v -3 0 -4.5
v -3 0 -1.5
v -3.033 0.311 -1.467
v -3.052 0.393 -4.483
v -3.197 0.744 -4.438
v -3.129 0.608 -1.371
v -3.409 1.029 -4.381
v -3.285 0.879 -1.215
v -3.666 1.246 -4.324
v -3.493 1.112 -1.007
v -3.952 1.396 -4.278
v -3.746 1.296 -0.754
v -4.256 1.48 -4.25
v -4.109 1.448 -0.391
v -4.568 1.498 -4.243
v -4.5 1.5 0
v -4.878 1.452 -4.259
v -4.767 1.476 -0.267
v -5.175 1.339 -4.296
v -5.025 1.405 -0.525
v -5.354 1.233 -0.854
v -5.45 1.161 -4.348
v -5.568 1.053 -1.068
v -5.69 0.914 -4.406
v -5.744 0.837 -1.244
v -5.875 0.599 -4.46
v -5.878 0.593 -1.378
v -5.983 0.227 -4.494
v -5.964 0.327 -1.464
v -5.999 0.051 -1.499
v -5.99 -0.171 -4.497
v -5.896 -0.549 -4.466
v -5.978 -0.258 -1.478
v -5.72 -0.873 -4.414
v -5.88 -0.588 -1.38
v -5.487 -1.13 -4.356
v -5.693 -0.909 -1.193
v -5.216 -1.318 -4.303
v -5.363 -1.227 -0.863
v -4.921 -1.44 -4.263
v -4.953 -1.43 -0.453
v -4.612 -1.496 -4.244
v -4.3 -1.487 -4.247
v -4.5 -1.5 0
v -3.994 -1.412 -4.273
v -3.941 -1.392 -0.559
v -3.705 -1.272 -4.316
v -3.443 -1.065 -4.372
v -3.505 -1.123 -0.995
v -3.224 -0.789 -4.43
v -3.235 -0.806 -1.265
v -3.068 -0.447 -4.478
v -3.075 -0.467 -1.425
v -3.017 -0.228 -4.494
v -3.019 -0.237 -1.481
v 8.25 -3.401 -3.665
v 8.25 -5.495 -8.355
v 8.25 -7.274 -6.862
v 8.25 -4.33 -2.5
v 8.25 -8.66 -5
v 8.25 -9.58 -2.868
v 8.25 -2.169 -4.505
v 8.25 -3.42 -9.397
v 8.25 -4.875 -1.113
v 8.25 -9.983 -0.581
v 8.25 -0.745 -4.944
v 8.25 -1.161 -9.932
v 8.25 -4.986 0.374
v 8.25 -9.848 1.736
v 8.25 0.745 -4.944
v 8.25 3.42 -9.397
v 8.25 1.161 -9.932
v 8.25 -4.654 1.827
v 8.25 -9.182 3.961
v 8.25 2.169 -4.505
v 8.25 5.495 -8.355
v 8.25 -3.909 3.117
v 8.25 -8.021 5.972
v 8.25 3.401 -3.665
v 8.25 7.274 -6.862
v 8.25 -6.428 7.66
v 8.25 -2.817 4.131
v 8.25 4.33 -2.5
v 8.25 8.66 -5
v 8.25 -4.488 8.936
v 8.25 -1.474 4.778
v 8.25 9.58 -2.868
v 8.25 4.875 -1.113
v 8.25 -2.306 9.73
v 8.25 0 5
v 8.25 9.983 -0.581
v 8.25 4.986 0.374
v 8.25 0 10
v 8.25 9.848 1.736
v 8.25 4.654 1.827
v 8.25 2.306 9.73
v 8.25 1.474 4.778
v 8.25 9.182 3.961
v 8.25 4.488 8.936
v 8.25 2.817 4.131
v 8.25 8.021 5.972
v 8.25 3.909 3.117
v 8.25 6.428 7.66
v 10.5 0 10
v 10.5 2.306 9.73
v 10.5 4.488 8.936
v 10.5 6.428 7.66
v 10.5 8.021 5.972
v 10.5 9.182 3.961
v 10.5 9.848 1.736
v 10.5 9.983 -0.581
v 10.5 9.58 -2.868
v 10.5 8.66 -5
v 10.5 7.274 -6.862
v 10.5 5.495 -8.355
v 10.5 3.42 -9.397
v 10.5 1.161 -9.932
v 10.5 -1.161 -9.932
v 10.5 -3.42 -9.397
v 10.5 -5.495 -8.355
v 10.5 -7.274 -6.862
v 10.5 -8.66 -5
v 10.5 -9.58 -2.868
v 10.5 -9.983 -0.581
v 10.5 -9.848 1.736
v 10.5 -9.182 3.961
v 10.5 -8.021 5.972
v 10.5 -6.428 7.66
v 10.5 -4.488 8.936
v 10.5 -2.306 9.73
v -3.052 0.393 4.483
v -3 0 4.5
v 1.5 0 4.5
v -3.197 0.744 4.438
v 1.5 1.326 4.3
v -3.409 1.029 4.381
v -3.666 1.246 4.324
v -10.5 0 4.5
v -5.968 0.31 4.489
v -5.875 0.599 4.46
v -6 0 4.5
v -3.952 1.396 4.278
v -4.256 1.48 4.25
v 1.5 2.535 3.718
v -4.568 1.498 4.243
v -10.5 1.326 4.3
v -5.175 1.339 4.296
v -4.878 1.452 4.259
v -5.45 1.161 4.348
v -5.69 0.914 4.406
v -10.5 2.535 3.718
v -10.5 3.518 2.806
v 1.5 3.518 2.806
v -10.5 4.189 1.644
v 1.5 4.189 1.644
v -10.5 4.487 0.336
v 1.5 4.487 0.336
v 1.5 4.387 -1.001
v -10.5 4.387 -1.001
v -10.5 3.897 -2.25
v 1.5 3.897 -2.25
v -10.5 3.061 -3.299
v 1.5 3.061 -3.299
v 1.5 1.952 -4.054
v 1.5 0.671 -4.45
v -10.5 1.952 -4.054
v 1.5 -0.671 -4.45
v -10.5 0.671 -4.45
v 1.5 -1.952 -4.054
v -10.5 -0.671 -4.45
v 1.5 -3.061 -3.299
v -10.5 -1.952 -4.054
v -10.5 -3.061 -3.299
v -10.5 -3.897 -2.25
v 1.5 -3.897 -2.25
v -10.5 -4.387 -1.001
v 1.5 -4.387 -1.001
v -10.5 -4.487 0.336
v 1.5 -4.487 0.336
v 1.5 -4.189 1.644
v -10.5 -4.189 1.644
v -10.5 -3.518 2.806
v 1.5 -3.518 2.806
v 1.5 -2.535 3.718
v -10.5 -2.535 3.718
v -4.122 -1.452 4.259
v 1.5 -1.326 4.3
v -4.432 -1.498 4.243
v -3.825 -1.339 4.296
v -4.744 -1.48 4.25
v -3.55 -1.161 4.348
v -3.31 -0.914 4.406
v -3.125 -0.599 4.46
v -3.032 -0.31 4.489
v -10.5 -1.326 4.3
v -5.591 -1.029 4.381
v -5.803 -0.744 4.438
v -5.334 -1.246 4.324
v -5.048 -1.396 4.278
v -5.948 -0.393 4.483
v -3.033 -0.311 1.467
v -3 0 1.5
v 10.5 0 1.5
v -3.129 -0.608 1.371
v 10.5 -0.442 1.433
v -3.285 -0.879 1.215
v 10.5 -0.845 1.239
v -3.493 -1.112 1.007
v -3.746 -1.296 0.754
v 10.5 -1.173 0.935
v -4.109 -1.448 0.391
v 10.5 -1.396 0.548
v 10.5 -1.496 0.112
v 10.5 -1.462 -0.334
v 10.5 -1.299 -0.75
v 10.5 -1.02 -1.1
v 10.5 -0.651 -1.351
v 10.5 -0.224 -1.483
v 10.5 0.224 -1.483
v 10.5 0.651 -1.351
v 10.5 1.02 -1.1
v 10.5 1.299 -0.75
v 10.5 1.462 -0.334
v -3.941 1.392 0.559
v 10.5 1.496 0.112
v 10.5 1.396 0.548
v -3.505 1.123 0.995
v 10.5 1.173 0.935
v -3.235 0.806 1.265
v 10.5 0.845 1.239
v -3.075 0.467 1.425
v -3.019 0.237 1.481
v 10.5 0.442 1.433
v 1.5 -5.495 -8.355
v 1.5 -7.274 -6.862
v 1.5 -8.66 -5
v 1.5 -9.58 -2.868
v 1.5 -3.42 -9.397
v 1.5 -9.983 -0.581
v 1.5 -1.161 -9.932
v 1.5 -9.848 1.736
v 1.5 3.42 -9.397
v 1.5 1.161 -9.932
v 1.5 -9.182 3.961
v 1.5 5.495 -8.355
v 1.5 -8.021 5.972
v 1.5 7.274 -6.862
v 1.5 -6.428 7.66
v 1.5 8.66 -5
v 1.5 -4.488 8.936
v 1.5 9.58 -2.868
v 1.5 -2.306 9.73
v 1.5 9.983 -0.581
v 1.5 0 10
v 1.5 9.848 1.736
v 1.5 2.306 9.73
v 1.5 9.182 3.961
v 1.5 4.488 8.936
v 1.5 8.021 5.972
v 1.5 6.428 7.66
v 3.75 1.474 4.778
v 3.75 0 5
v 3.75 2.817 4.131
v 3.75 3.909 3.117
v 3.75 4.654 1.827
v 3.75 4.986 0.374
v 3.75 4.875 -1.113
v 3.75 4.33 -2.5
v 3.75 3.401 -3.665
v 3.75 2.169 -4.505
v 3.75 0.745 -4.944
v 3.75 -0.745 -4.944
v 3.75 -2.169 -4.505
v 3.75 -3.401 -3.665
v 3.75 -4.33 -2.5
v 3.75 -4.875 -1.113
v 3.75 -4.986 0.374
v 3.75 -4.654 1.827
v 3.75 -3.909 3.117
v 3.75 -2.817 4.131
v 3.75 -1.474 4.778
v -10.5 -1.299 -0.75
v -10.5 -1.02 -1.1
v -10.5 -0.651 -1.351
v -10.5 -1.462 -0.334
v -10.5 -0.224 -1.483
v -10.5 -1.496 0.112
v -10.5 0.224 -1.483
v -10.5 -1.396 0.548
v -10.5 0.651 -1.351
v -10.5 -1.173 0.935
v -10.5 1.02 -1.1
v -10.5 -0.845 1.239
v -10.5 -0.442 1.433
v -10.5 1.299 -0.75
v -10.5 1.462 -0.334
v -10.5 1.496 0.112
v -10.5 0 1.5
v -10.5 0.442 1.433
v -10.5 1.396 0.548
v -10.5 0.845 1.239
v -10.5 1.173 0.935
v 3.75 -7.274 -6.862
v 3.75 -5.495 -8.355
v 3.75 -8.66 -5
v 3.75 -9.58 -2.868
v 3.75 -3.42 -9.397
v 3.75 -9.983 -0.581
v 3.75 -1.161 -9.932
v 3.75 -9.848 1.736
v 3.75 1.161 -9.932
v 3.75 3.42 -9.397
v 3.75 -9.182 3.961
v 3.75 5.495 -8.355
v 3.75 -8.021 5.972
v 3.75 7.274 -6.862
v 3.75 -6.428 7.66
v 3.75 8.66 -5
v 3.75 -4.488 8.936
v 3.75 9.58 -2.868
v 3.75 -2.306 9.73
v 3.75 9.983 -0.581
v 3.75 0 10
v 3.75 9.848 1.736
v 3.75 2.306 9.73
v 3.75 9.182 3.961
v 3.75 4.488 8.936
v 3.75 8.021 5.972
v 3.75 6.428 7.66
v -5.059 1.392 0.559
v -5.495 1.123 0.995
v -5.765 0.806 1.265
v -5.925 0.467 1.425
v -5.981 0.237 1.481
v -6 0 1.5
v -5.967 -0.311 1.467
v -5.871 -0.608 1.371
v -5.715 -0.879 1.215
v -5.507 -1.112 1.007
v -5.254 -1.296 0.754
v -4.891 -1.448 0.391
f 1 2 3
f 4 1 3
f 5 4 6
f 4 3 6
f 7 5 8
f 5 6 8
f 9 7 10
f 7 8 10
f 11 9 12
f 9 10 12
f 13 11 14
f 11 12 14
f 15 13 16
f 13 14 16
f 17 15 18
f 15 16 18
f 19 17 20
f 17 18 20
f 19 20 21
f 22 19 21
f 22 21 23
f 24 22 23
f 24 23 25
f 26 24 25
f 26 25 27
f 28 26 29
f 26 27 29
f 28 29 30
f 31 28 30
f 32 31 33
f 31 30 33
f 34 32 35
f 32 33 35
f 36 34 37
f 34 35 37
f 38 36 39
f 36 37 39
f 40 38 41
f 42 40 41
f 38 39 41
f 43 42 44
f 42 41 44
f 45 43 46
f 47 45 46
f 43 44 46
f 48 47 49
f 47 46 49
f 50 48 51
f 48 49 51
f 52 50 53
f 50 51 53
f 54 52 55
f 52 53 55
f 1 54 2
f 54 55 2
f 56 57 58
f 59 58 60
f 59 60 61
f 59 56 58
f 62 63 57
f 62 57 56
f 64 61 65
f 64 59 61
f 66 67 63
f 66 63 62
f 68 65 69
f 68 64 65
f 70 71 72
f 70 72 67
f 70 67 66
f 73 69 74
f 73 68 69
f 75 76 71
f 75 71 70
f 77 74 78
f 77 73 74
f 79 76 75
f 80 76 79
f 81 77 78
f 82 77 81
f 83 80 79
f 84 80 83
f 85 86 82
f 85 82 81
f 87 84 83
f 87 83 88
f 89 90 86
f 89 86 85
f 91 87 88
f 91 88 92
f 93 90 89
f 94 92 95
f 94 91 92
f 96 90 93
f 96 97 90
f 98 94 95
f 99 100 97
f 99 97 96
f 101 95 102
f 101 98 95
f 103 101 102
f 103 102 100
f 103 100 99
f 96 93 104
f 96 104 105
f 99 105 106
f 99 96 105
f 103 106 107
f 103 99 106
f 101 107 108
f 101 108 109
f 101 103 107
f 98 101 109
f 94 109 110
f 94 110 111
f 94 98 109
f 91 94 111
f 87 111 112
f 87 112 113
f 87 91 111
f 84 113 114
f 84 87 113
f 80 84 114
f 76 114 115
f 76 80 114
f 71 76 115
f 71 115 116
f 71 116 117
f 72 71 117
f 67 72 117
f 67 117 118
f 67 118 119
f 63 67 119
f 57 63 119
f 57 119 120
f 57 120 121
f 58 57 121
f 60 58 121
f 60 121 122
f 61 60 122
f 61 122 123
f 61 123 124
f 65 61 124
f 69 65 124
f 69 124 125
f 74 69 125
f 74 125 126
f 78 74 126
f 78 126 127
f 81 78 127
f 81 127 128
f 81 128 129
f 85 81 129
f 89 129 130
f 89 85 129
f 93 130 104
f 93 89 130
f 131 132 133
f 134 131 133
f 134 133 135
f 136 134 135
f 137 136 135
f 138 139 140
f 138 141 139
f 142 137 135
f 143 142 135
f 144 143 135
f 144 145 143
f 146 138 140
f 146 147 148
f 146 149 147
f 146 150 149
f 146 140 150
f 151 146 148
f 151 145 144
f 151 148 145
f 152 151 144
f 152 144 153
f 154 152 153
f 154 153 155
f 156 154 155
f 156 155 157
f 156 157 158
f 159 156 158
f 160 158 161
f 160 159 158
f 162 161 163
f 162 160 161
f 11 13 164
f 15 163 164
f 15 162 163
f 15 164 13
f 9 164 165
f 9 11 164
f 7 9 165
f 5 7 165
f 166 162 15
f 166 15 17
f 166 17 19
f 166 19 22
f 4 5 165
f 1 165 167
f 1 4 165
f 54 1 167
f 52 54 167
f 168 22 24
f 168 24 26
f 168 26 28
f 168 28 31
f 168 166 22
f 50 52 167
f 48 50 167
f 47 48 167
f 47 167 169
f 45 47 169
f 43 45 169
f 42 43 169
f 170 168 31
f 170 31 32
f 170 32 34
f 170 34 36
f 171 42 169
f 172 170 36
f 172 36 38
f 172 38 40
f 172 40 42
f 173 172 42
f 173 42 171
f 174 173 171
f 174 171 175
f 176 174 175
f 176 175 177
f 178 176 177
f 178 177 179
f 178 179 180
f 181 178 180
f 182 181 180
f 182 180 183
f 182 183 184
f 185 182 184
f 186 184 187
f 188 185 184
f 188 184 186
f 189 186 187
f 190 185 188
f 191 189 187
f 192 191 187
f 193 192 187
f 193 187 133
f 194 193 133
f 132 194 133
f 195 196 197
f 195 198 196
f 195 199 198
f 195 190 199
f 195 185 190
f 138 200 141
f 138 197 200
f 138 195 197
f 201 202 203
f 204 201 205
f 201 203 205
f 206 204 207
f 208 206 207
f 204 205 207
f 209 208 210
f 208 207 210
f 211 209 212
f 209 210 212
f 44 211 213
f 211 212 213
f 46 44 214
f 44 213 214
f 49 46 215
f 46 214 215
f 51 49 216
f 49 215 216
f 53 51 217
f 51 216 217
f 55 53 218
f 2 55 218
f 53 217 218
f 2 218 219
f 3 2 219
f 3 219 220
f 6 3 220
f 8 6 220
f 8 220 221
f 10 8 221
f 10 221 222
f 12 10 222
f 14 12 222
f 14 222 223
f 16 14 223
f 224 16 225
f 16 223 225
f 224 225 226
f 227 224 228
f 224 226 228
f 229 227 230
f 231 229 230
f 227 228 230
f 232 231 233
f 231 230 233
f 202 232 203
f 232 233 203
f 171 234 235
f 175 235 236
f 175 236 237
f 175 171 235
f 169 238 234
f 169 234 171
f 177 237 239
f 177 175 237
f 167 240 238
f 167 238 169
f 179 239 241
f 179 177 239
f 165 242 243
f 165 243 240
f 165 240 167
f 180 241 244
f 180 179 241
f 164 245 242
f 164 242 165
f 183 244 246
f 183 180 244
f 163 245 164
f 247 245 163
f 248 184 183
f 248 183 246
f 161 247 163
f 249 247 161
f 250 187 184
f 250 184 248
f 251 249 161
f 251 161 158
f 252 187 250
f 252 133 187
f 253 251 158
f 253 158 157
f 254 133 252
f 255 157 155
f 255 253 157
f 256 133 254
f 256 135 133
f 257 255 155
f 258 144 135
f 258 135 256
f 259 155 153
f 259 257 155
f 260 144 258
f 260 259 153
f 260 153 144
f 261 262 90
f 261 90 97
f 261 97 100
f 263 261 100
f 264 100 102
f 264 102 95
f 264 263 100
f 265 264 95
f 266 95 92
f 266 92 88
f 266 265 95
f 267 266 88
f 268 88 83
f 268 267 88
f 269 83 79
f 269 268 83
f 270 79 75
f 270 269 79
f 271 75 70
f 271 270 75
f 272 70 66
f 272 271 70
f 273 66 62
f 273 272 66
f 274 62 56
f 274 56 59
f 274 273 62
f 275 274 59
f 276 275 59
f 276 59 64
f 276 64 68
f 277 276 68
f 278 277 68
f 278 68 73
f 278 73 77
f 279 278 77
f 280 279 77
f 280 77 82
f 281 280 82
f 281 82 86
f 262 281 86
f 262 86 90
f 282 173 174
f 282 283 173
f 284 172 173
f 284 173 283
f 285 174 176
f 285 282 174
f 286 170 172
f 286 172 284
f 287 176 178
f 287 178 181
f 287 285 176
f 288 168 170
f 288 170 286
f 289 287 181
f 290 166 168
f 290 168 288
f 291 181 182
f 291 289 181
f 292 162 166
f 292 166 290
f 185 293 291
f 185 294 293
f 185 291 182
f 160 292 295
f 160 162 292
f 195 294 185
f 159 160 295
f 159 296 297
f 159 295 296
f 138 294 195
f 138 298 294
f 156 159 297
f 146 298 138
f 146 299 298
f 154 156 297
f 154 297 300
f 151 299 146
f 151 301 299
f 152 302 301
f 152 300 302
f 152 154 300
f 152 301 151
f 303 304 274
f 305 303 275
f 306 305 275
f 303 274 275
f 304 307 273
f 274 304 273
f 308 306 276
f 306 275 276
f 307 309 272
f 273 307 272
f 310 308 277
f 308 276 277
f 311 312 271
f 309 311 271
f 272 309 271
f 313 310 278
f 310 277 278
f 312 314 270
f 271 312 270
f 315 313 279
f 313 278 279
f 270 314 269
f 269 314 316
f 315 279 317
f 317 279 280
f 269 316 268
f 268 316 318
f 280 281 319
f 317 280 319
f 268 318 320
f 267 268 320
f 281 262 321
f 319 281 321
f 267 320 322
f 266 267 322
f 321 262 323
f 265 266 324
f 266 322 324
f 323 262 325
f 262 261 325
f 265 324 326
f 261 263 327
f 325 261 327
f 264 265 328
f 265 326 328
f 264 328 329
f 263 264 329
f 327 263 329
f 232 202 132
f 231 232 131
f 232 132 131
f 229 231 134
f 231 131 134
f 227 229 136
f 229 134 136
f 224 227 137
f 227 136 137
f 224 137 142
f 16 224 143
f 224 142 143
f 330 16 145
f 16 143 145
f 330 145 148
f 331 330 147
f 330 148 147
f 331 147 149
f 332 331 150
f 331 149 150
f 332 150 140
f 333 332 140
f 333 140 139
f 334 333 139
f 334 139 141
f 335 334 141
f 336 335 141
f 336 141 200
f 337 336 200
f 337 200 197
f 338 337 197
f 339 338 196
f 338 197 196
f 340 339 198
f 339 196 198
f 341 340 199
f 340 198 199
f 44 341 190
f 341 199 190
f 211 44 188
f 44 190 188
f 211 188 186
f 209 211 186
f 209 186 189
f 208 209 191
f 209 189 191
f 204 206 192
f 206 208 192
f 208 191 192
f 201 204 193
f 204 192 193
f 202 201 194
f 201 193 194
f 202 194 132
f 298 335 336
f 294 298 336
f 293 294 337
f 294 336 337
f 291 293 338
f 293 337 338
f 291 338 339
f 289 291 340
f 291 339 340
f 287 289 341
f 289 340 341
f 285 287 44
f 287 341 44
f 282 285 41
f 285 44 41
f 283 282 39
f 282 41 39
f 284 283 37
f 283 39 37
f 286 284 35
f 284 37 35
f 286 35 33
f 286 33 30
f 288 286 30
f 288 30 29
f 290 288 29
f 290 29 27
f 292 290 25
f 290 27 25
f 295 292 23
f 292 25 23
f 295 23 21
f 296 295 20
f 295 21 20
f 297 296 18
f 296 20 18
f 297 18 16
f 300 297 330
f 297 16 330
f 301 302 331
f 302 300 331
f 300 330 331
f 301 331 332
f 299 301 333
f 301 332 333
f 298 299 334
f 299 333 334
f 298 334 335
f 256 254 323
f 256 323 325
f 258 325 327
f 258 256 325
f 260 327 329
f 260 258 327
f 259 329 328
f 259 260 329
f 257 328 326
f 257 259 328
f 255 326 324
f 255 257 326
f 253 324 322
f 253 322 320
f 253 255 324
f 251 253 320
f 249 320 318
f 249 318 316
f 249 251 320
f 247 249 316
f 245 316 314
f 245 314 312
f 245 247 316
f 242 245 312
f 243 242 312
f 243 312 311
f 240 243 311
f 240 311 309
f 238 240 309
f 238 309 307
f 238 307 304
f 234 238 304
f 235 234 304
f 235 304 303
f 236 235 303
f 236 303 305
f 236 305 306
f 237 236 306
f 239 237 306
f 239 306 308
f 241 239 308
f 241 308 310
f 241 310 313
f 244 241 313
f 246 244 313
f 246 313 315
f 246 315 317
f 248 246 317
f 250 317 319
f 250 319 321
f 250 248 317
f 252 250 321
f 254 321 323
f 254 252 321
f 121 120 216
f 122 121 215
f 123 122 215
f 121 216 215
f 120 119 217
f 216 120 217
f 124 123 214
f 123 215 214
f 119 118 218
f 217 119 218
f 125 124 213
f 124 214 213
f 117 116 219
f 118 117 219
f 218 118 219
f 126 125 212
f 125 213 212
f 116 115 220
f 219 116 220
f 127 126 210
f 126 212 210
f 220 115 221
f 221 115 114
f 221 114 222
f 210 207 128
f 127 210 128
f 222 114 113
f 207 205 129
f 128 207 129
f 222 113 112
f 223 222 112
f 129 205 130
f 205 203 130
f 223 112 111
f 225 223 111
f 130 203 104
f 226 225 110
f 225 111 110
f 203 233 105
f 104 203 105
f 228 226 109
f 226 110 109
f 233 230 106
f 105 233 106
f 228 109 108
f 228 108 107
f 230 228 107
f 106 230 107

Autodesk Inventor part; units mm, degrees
ref_plane "YZ Plane" through (0, 0, 0) normal (1, 0, 0) x (0, 1, 0)
ref_plane "XZ Plane" through (0, 0, 0) normal (0, 1, 0) x (-1, 0, 0)
ref_plane "XY Plane" through (0, 0, 0) normal (0, 0, 1) x (1, 0, 0)
sketch "Sketch1" plane through (0, 0, 0) normal (0, 1, 0) x (-1, 0, 0)
  line L0 (-10.5, 0) -> (10.5, 0)
  line L1 (-10.5, 1.5) -> (-10.5, 10)
  line L2 (-10.5, 10) -> (-8.25, 10)
  line L3 (-8.25, 10) -> (-8.25, 5)
  line L4 (-8.25, 5) -> (-3.75, 5)
  line L5 (-3.75, 5) -> (-3.75, 10)
  line L6 (-3.75, 10) -> (-1.5, 10)
  line L7 (-1.5, 10) -> (-1.5, 4.5)
  line L8 (-1.5, 4.5) -> (10.5, 4.5)
  line L9 (10.5, 4.5) -> (10.5, 1.5)
  line L10 (10.5, 1.5) -> (-10.5, 1.5)
  line L11 (-10.5, 1.5) -> (-10.5, 0) construction
  line L12 (10.5, 1.5) -> (10.5, 0) construction
  line L13 (-8.25, 10) -> (-3.75, 10) construction
  line L14 (-6, 5) -> (-6, 1.5) construction
  line L15 (4.5, 4) -> (4.5, 1.5) construction
  point P0 (0, 0)
  point P1 (0, 0)
  dimension "d0" = 21
  dimension "d1" = 3
  dimension "d2" = 20
  dimension "d3" = 10
  dimension "d4" = 9
  dimension "d5" = 4.5
  dimension "d6" = 16.5
  dimension "d7" = 12
  dimension "d10" = 6
revolve "Revolution1" add sketch "Sketch1" angle 360 about axis through (10.5, 0, 0) along (-1, 0, 0)
sketch "Sketch2" plane through (0, 0, 0) normal (0, 0, 1) x (1, 0, 0)
  circle A0 centre (-4.5, 0) radius 1.5
  line L0 (-3.5, 4) -> (-3.5, -4) projected
  line L1 (-5.5, 4) -> (-5.5, -4) projected
  line L2 (-3.5, 0) -> (-5.5, 0) construction
  line L3 (1.5, 4.5) -> (1.5, -4.5) construction
  point P0 (0, 0)
  dimension "d12" = 3
extrude "Extrusion1" cut sketch "Sketch2" along normal through all both and the other way through all
thread "Thread1" size "M3x0.5" class "6H" standard "ANSI Metric M Profile" full length
equation "\"d13\" = d12"
properties part number "slider-2" material "Brass, Soft Yellow"
